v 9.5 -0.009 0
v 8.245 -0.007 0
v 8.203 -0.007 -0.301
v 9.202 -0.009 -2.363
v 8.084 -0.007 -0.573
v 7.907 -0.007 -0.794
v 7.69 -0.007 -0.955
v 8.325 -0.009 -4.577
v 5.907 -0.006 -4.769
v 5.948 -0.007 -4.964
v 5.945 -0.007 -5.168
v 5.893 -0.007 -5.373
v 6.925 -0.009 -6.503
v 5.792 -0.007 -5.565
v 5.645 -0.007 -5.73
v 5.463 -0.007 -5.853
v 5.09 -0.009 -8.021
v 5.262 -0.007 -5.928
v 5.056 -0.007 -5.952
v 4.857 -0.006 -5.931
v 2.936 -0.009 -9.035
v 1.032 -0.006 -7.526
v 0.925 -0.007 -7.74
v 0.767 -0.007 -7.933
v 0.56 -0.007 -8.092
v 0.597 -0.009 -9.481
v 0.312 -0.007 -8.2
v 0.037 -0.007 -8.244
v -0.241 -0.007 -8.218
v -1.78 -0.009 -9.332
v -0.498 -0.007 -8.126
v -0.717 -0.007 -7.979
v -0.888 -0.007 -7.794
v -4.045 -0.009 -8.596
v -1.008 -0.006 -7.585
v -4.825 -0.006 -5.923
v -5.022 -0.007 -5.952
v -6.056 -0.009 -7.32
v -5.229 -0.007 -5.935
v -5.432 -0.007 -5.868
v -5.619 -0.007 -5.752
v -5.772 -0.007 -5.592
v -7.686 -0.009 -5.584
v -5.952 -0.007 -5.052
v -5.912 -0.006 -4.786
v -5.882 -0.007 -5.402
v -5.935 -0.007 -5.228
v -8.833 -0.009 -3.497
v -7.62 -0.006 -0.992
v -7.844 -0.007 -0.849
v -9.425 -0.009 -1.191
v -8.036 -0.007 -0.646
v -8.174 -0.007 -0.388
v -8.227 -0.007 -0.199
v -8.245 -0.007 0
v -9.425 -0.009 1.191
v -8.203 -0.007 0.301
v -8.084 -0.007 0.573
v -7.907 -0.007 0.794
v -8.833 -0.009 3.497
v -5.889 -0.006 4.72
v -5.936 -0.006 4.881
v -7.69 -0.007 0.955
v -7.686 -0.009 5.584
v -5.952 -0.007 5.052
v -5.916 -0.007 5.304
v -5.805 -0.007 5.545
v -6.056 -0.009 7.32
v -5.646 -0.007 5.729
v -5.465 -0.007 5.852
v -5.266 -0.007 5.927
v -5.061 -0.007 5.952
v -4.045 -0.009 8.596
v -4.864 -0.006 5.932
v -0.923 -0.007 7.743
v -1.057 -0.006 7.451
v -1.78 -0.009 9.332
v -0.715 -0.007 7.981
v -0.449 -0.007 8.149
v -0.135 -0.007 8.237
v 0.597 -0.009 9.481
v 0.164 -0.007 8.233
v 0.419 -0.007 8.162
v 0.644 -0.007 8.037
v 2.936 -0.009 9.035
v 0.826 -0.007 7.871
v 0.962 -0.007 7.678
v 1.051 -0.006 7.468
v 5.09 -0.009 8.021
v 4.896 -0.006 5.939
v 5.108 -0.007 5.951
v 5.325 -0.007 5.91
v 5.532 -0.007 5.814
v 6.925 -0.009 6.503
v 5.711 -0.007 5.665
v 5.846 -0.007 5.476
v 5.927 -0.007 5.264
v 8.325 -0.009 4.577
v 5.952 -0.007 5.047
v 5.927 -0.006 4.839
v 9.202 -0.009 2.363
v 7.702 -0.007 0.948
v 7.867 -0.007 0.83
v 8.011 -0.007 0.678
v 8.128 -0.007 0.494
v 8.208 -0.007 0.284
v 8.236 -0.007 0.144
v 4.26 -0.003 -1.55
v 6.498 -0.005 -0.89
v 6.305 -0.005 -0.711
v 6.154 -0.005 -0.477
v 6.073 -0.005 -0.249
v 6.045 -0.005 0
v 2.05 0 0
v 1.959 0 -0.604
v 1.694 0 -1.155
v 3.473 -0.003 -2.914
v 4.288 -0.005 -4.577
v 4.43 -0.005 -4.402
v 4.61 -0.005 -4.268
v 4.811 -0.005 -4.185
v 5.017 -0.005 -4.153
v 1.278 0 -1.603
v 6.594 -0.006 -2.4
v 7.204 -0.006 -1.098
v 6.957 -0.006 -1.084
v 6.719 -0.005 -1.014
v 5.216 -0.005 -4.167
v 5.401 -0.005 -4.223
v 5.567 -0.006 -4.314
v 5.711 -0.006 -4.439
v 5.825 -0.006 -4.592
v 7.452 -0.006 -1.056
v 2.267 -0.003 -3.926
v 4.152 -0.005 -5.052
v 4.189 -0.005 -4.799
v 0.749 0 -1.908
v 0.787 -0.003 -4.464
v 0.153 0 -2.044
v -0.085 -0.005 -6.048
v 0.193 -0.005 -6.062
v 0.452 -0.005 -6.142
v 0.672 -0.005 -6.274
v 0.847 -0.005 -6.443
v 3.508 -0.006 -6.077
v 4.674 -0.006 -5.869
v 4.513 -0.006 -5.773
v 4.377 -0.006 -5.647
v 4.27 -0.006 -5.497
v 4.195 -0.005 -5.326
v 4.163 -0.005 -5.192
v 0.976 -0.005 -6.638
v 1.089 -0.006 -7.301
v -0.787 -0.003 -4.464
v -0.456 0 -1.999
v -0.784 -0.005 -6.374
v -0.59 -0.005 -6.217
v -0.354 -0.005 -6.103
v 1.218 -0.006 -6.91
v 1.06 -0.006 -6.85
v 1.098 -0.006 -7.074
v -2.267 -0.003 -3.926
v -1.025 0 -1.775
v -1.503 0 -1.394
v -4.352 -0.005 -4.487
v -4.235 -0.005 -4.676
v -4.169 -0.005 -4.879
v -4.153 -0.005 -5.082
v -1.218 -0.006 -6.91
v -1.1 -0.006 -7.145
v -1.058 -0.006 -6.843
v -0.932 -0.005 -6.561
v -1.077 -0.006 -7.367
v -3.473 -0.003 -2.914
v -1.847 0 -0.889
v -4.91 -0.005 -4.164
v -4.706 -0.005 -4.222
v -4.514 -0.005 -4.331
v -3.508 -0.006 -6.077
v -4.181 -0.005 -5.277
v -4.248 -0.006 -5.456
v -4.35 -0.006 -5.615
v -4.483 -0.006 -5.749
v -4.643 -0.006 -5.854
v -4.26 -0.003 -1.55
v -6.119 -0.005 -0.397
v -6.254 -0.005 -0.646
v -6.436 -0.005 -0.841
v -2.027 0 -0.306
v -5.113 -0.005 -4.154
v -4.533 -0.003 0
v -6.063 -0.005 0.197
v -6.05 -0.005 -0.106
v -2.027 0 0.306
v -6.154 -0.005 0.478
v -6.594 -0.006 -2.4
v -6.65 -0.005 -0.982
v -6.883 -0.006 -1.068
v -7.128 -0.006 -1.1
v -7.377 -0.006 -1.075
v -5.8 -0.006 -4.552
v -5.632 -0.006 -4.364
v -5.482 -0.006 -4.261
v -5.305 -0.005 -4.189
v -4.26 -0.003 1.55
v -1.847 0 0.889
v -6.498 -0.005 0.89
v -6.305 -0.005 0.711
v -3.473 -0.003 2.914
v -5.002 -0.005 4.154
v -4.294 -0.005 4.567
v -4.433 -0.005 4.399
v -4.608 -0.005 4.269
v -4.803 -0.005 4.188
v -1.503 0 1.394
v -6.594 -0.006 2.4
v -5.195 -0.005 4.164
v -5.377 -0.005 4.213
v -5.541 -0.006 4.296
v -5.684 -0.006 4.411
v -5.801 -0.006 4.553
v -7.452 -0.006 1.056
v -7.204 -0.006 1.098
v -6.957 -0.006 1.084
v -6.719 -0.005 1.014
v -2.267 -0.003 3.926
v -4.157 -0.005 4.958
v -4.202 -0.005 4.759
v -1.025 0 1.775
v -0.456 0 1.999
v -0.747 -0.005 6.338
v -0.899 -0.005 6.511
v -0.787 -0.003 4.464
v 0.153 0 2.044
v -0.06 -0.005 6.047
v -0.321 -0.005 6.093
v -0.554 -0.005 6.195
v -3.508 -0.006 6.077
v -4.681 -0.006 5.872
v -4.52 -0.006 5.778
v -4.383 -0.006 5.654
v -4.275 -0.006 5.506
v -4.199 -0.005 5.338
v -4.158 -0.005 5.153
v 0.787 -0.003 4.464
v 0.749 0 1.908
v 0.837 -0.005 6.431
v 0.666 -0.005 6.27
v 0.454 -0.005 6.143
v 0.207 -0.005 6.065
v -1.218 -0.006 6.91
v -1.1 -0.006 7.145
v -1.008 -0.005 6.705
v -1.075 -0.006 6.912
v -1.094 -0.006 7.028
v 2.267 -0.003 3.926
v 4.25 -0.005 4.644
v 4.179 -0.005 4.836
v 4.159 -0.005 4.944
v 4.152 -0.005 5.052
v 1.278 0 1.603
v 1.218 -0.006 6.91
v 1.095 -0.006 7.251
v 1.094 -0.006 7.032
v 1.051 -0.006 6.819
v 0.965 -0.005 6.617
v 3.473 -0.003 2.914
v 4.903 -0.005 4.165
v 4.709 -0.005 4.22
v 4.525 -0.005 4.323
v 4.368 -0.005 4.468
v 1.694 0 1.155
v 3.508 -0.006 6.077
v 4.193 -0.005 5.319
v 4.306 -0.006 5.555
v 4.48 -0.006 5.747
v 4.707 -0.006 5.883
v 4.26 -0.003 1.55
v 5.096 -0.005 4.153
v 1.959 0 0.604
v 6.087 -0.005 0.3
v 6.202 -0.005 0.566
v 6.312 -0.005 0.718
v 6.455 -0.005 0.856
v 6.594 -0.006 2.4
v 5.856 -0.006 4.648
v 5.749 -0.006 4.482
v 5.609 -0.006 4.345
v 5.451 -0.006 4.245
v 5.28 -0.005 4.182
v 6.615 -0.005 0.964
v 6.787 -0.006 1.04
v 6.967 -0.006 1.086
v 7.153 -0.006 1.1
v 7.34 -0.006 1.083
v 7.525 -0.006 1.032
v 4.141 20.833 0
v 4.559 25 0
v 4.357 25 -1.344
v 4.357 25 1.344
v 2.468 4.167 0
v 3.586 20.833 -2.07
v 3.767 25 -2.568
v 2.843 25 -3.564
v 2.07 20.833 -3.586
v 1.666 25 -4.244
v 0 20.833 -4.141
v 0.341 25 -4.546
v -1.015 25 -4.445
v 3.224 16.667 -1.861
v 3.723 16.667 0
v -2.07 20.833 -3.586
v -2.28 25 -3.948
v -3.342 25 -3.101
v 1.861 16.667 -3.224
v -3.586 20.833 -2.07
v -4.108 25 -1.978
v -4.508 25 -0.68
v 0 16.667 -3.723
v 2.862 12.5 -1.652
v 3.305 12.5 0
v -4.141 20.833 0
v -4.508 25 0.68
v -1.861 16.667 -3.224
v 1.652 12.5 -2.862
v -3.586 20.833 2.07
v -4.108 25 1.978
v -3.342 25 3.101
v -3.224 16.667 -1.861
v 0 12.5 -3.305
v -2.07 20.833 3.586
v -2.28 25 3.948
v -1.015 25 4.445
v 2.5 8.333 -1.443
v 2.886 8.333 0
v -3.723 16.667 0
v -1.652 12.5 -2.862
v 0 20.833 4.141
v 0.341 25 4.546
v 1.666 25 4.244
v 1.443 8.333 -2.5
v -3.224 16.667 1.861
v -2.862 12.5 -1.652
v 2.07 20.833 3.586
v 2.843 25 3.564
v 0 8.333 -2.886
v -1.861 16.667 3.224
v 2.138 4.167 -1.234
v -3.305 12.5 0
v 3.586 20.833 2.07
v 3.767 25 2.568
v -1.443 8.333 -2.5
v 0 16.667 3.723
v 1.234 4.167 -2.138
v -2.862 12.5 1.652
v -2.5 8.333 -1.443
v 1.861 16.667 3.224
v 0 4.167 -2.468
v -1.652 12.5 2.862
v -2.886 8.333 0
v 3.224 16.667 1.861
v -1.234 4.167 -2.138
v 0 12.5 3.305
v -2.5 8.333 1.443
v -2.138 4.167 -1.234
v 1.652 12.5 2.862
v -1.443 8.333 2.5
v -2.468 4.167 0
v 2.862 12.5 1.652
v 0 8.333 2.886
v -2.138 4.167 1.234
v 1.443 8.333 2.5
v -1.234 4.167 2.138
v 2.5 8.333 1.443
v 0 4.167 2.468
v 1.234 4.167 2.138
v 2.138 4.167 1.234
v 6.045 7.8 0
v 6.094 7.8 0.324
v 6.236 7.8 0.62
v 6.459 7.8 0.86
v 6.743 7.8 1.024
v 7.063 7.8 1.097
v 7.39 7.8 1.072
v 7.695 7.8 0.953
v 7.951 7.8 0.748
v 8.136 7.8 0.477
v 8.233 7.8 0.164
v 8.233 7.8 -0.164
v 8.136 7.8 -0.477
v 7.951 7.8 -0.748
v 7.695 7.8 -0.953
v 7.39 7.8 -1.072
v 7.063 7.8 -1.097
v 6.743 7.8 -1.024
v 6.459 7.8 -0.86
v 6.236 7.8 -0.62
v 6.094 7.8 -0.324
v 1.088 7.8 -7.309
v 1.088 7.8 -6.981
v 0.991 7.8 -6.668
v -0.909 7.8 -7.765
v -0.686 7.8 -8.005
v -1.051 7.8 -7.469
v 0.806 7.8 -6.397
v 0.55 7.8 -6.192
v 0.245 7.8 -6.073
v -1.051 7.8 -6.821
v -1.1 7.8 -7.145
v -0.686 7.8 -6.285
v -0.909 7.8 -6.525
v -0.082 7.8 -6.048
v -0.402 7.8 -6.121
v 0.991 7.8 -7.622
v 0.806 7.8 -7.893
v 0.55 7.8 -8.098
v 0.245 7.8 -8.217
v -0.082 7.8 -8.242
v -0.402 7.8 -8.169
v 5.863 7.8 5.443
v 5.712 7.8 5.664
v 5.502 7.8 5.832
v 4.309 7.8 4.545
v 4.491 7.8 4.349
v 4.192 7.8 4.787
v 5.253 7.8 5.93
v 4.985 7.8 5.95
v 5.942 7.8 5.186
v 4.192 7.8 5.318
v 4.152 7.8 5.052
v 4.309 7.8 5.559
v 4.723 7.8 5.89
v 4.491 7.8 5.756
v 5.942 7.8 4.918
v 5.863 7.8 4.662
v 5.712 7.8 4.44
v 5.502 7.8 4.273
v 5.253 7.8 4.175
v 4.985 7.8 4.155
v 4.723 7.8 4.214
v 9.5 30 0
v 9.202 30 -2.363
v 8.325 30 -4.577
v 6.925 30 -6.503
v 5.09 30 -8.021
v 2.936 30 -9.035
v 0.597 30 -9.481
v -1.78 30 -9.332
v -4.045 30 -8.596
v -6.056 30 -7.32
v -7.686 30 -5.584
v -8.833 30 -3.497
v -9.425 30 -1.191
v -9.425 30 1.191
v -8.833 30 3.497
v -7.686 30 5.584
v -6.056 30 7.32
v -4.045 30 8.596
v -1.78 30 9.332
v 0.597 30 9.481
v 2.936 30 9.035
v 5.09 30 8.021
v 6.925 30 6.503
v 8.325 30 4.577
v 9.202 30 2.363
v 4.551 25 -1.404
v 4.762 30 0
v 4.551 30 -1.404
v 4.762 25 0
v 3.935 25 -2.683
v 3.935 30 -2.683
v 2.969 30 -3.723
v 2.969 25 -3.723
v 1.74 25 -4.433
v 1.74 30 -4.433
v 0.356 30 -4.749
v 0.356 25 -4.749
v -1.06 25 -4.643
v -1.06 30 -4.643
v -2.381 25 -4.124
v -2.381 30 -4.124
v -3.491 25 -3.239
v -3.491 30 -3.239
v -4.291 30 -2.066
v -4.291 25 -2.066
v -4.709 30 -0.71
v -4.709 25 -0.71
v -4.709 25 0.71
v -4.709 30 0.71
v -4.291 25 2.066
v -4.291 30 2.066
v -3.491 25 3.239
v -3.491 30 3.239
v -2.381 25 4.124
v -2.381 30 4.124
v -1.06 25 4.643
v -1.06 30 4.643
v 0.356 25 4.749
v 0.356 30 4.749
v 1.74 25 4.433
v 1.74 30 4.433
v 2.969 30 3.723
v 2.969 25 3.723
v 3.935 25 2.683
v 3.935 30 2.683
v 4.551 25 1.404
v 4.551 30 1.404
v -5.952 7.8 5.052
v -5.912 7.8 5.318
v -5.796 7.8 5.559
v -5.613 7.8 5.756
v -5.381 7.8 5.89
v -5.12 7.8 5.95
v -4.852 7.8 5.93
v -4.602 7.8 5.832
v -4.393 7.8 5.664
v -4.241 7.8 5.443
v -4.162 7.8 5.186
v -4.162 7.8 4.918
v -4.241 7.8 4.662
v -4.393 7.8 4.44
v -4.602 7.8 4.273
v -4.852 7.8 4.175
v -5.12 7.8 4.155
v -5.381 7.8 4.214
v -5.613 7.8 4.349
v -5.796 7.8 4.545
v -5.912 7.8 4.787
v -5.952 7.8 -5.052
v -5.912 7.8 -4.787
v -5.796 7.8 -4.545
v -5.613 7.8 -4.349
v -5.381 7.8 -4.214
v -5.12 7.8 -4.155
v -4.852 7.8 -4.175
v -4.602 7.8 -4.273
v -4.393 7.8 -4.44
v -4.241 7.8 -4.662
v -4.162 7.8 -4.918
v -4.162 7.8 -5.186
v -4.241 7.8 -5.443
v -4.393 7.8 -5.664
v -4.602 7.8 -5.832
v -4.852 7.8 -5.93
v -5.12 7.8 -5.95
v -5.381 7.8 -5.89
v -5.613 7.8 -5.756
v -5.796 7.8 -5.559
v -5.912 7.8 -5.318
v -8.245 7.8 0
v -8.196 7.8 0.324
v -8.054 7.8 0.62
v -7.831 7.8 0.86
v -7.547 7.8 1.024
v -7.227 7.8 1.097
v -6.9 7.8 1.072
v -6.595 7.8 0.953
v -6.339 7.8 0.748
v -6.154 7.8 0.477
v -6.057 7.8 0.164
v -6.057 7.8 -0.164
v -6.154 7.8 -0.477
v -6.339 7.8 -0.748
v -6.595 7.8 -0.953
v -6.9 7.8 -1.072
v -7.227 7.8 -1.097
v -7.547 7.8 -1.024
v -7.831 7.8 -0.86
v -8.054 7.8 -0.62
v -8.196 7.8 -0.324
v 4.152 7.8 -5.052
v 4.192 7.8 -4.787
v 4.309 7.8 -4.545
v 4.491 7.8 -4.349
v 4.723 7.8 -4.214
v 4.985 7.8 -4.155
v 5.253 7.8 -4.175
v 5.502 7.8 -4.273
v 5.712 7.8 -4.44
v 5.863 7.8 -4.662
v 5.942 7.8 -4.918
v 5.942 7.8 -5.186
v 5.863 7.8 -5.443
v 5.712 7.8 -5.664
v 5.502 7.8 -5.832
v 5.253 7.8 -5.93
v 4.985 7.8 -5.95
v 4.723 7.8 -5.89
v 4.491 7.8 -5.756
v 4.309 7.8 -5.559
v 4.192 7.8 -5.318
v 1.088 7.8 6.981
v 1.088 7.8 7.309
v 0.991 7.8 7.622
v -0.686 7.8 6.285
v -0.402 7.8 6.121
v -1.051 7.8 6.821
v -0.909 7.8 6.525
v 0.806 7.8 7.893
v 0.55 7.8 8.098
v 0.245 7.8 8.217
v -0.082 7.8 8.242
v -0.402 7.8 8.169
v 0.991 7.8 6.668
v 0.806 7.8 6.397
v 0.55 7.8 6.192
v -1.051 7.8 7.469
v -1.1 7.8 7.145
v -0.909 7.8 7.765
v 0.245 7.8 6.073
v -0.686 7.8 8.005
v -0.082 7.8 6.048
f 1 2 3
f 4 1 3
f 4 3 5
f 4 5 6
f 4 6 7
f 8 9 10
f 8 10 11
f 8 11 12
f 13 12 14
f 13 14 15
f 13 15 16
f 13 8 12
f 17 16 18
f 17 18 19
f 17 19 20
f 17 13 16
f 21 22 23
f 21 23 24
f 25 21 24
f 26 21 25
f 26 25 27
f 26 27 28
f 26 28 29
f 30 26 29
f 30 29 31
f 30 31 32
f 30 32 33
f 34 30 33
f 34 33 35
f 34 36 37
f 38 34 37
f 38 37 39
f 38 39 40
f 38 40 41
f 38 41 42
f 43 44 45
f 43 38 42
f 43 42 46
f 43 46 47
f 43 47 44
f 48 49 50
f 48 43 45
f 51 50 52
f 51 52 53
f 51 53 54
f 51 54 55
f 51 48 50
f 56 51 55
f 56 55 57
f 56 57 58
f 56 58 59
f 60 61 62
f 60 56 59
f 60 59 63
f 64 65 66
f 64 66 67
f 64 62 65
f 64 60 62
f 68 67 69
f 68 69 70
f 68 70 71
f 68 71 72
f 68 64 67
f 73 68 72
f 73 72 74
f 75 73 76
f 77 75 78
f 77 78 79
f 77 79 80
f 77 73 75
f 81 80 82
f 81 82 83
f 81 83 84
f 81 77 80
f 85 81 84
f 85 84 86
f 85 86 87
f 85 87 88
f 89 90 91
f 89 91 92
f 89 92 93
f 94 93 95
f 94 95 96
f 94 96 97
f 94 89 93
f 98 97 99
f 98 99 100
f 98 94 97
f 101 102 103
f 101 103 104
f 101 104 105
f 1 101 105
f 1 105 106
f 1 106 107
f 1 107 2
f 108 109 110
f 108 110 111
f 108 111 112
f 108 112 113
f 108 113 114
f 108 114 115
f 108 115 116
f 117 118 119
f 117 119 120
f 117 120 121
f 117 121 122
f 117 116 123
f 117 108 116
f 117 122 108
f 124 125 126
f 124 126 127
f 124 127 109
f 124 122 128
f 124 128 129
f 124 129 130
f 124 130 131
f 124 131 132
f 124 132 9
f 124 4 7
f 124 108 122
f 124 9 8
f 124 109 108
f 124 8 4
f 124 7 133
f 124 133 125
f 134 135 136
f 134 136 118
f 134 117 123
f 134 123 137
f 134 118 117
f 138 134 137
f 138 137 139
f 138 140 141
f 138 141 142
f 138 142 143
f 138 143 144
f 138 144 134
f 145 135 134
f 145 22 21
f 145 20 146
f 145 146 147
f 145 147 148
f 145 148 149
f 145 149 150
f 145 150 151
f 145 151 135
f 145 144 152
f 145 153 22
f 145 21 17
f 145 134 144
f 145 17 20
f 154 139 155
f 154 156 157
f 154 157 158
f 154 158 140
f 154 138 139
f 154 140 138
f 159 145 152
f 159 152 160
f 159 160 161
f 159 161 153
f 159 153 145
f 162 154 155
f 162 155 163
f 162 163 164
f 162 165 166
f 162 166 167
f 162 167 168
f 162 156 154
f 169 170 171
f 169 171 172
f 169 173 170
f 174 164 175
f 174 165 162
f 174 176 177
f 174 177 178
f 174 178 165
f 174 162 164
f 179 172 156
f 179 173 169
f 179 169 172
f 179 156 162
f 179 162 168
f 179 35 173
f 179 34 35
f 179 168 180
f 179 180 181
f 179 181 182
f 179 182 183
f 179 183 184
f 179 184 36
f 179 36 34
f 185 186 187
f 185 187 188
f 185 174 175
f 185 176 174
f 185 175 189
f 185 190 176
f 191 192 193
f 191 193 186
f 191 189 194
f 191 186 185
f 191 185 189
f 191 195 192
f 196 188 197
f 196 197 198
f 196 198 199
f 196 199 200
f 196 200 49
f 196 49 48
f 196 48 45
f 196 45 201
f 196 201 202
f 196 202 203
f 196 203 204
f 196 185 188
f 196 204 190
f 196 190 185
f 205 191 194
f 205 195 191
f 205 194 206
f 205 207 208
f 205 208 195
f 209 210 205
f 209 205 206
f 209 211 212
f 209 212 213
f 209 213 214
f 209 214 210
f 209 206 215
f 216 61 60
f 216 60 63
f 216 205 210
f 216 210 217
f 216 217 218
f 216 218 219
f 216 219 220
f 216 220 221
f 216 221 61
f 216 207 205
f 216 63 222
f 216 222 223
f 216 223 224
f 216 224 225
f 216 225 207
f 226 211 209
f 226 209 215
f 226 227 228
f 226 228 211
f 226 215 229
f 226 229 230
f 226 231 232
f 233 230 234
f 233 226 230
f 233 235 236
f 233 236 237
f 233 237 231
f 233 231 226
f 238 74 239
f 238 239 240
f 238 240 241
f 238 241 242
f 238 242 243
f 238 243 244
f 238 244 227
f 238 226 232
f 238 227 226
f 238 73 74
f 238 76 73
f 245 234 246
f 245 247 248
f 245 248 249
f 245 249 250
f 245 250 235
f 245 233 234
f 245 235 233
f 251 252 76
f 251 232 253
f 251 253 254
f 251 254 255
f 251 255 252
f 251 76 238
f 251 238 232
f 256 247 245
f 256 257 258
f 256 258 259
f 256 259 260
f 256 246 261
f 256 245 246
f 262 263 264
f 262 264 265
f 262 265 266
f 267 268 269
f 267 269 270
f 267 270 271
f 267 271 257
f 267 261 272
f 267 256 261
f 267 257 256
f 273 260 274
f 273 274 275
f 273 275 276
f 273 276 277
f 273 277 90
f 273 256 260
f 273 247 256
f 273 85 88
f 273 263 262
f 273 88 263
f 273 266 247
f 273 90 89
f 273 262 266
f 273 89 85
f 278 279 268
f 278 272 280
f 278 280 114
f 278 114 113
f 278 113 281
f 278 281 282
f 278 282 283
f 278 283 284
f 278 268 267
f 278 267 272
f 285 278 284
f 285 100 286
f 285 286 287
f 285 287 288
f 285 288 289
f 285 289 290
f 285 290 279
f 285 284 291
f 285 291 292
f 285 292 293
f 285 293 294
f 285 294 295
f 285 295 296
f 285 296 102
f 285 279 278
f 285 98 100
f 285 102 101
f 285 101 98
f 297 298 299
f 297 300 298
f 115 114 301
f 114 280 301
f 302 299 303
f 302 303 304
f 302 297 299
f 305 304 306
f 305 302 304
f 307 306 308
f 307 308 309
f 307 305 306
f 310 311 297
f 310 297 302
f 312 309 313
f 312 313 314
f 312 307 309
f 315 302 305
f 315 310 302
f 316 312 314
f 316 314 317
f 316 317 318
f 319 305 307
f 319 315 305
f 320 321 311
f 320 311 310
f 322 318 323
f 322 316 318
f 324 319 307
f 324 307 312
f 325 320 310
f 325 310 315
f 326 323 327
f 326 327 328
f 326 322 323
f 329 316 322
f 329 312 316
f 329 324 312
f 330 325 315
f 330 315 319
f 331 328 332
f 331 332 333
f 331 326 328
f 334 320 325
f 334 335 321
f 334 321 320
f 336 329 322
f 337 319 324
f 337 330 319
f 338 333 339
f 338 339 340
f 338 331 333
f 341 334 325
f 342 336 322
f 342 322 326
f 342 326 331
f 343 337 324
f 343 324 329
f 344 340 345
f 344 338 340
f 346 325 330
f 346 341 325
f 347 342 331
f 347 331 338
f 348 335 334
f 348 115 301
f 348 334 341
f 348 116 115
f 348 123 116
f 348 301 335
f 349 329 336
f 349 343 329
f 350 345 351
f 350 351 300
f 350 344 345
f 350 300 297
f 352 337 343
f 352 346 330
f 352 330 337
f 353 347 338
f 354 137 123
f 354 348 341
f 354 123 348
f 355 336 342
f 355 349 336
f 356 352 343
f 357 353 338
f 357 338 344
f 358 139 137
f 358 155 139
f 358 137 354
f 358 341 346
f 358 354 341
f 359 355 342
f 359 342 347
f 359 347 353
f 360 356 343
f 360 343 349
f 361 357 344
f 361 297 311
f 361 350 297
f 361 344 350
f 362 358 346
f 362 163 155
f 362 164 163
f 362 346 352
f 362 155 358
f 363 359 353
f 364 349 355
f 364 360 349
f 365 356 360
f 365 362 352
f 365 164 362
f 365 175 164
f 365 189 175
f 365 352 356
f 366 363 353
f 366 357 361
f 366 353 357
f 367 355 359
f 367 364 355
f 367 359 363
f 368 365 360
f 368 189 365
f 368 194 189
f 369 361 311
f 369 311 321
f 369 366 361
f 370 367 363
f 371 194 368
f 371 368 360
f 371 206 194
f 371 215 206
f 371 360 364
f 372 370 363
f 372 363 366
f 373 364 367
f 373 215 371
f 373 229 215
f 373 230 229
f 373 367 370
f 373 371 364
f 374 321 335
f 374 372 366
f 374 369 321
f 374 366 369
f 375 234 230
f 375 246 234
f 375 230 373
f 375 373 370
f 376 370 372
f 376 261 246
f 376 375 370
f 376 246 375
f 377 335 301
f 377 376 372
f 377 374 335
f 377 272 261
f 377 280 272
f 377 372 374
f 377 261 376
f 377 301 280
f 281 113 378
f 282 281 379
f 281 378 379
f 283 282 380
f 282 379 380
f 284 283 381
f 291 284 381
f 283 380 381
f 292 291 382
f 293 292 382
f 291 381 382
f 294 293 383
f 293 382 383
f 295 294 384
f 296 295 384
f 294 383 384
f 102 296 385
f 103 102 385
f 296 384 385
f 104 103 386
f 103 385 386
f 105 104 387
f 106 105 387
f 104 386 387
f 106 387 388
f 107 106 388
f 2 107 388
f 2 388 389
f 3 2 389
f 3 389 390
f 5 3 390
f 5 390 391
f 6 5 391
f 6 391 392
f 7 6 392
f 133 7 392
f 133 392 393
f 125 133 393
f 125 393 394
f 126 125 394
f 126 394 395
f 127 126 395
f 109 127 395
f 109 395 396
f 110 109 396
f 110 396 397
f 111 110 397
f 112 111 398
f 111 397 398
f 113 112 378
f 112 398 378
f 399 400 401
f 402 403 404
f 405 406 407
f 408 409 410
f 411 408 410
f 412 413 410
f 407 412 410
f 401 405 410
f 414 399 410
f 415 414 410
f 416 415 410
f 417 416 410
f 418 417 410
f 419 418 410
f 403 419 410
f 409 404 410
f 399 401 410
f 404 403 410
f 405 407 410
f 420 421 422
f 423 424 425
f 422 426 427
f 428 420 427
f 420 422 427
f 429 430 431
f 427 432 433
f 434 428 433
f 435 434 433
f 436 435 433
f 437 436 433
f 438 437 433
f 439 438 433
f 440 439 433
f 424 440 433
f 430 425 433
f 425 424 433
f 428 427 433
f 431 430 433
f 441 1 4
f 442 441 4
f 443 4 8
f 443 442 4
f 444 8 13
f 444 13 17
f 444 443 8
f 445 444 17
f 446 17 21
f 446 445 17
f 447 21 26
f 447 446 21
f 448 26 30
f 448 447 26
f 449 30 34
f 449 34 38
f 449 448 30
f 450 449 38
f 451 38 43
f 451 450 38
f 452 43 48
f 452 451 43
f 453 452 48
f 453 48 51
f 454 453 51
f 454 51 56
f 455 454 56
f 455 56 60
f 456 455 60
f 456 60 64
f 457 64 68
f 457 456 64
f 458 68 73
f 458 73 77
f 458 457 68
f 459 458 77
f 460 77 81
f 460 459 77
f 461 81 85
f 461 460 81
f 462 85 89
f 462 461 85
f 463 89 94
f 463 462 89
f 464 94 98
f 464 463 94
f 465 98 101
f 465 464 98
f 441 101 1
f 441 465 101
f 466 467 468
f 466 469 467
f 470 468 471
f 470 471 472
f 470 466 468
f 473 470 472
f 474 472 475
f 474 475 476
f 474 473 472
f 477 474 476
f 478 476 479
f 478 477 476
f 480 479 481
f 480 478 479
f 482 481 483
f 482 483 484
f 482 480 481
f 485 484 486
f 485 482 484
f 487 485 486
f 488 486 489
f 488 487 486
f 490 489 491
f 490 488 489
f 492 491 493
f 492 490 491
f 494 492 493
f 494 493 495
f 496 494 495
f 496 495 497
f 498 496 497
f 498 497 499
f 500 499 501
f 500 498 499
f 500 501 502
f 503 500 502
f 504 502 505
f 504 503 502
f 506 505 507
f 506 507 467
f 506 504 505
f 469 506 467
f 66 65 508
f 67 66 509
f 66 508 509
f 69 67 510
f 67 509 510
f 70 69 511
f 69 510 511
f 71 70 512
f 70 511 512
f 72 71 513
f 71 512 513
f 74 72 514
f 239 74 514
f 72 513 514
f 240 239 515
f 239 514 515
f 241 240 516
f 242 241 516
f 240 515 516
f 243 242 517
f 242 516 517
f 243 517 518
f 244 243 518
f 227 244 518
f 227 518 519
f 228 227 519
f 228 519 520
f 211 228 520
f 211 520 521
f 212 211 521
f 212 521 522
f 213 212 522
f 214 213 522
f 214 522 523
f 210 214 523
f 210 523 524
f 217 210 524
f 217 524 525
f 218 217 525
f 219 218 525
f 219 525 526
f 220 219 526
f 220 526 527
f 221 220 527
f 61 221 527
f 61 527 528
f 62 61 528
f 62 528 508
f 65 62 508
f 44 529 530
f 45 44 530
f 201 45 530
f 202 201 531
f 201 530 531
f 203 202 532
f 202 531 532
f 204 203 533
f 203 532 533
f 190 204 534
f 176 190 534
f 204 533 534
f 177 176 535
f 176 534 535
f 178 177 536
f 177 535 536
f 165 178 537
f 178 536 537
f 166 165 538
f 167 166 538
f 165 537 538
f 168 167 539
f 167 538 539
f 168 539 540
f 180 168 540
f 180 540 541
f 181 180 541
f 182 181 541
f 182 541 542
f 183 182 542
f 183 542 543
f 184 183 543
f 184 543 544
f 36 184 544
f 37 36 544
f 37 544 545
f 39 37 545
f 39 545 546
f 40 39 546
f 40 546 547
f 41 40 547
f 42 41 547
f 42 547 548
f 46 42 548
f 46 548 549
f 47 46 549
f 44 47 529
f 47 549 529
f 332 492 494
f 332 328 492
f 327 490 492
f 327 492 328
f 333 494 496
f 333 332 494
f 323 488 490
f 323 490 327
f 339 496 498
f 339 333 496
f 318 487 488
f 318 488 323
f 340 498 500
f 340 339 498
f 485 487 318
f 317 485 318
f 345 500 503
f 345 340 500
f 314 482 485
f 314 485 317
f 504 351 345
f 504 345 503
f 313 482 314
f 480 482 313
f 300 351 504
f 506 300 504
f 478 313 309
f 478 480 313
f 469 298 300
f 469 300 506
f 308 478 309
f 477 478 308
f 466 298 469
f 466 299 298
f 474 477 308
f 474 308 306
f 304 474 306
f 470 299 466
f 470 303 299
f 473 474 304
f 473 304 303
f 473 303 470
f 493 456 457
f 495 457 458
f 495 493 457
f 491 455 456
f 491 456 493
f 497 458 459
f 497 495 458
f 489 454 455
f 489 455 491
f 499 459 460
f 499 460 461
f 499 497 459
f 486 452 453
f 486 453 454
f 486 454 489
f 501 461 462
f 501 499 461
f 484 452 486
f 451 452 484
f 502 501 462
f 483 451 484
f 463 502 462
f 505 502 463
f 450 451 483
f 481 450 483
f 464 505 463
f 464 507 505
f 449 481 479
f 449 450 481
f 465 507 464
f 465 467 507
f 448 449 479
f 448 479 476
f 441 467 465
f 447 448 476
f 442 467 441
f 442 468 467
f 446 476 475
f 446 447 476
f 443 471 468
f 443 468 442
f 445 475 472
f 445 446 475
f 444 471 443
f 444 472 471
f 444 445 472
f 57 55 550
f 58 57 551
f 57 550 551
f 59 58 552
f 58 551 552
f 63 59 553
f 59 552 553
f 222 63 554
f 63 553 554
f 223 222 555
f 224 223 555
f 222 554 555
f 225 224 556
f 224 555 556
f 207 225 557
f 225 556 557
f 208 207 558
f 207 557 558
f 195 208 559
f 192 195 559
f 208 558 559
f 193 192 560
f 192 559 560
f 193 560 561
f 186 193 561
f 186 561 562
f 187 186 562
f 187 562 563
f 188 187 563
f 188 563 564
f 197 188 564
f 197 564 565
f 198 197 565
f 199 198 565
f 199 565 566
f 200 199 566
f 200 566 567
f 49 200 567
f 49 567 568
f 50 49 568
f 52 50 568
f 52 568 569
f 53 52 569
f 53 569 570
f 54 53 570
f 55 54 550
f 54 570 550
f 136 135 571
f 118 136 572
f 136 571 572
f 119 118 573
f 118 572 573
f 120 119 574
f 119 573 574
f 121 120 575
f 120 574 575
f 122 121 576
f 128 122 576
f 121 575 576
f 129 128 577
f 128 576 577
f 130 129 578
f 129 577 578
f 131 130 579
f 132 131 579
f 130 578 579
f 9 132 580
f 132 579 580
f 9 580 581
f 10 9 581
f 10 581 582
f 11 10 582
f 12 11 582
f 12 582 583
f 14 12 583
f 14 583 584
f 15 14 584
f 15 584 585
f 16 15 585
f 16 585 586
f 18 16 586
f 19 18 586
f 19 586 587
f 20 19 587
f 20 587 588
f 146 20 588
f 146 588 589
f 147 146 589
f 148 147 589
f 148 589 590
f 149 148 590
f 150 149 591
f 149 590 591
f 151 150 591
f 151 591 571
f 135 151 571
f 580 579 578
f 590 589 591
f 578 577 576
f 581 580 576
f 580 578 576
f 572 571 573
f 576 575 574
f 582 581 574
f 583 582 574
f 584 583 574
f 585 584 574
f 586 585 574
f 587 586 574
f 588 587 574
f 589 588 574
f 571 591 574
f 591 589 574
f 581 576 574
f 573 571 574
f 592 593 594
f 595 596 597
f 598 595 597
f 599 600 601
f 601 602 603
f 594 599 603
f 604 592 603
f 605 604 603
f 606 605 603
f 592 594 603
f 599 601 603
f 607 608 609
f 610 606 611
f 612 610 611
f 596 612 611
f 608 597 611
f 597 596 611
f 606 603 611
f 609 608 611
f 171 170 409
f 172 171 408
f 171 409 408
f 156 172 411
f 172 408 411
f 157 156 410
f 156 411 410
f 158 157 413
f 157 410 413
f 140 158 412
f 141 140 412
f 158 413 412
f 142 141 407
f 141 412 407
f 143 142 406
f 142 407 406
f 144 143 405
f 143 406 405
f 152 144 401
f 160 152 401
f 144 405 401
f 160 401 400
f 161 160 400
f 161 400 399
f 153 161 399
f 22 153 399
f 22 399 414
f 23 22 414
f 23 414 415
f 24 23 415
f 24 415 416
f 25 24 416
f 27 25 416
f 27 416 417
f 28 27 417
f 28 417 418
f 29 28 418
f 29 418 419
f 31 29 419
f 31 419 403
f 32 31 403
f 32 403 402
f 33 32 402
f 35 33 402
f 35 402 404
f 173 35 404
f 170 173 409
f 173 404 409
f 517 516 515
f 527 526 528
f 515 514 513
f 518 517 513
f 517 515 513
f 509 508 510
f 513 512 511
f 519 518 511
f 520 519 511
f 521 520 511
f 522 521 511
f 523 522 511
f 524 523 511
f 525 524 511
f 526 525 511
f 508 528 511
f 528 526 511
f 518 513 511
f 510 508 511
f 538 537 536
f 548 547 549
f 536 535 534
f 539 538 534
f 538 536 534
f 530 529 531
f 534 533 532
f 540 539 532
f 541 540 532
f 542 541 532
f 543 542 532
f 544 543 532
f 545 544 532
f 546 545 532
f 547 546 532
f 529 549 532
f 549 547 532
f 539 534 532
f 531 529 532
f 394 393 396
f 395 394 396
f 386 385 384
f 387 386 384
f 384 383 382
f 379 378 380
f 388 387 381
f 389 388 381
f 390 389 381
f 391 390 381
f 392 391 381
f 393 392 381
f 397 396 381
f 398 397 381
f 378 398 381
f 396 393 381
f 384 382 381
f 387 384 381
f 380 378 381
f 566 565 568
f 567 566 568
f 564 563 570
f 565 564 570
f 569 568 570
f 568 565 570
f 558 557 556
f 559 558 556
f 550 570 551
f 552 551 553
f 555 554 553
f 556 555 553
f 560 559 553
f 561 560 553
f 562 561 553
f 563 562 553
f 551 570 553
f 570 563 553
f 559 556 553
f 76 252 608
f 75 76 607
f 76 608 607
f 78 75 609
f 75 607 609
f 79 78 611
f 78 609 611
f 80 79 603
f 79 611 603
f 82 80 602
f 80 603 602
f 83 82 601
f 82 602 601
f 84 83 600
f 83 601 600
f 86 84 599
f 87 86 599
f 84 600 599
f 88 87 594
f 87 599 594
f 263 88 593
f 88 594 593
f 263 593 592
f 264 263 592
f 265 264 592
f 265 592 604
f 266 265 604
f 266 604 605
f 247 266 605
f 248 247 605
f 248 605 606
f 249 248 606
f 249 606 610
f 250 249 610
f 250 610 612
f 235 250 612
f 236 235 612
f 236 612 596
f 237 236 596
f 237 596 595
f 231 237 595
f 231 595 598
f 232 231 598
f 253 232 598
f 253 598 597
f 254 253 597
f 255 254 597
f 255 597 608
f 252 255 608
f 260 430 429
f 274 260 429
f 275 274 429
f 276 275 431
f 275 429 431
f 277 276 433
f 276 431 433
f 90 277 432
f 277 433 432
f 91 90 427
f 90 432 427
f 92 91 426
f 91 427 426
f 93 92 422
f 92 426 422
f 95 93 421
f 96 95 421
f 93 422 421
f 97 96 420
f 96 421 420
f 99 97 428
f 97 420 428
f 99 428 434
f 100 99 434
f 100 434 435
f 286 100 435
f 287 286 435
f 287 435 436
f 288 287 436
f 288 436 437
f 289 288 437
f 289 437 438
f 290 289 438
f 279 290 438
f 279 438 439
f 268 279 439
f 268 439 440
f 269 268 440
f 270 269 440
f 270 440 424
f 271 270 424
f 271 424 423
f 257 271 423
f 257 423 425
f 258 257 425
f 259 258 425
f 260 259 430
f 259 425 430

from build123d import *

# Parameters (mm, degrees)
CUT_EXTRUDE2_START = -22.2
SKETCH4_R          = 1.1
SKETCH4_R_2        = 0.9
CUT_EXTRUDE2_DEPTH = 8


with BuildPart() as part:
    # Sketch1 → Revolve1 (revolve)
    with BuildSketch(Plane.XY):
        Polygon((4.762351203, 30), (4.762351203, 25), (4.559151203, 25), (2.05, 0), (9.5, -0.008522661), (9.5, 30), align=None)
    revolve(axis=Axis((0, 0, 0), (0, 1, 0)))

    # Sketch4 → Cut-Extrude2 (cut)
    with BuildSketch(Plane(origin=(0, 30, 0), x_dir=(1, 0, 0), z_dir=(0, 1, 0)).offset(CUT_EXTRUDE2_START)):
        with Locations(Location((0, 7.145, 0), (0, 0, 180))):
            Circle(SKETCH4_R)
        with Locations(Location((7.145, 0, 0), (0, 0, 180))):
            Circle(SKETCH4_R)
        with Locations(Location((0, -7.145, 0), (0, 0, 180))):
            Circle(SKETCH4_R)
        with Locations(Location((-7.145, 0, 0), (0, 0, 180))):
            Circle(SKETCH4_R)
        with Locations(Location((5.052277952, 5.052277952, 0), (0, 0, 180))):
            Circle(SKETCH4_R_2)
        with Locations(Location((5.052277952, -5.052277952, 0), (0, 0, 180))):
            Circle(SKETCH4_R_2)
        with Locations(Location((-5.052277952, -5.052277952, 0), (0, 0, 180))):
            Circle(SKETCH4_R_2)
        with Locations(Location((-5.052277952, 5.052277952, 0), (0, 0, 180))):
            Circle(SKETCH4_R_2)
    extrude(amount=-CUT_EXTRUDE2_DEPTH, mode=Mode.SUBTRACT)


solid = part.part
